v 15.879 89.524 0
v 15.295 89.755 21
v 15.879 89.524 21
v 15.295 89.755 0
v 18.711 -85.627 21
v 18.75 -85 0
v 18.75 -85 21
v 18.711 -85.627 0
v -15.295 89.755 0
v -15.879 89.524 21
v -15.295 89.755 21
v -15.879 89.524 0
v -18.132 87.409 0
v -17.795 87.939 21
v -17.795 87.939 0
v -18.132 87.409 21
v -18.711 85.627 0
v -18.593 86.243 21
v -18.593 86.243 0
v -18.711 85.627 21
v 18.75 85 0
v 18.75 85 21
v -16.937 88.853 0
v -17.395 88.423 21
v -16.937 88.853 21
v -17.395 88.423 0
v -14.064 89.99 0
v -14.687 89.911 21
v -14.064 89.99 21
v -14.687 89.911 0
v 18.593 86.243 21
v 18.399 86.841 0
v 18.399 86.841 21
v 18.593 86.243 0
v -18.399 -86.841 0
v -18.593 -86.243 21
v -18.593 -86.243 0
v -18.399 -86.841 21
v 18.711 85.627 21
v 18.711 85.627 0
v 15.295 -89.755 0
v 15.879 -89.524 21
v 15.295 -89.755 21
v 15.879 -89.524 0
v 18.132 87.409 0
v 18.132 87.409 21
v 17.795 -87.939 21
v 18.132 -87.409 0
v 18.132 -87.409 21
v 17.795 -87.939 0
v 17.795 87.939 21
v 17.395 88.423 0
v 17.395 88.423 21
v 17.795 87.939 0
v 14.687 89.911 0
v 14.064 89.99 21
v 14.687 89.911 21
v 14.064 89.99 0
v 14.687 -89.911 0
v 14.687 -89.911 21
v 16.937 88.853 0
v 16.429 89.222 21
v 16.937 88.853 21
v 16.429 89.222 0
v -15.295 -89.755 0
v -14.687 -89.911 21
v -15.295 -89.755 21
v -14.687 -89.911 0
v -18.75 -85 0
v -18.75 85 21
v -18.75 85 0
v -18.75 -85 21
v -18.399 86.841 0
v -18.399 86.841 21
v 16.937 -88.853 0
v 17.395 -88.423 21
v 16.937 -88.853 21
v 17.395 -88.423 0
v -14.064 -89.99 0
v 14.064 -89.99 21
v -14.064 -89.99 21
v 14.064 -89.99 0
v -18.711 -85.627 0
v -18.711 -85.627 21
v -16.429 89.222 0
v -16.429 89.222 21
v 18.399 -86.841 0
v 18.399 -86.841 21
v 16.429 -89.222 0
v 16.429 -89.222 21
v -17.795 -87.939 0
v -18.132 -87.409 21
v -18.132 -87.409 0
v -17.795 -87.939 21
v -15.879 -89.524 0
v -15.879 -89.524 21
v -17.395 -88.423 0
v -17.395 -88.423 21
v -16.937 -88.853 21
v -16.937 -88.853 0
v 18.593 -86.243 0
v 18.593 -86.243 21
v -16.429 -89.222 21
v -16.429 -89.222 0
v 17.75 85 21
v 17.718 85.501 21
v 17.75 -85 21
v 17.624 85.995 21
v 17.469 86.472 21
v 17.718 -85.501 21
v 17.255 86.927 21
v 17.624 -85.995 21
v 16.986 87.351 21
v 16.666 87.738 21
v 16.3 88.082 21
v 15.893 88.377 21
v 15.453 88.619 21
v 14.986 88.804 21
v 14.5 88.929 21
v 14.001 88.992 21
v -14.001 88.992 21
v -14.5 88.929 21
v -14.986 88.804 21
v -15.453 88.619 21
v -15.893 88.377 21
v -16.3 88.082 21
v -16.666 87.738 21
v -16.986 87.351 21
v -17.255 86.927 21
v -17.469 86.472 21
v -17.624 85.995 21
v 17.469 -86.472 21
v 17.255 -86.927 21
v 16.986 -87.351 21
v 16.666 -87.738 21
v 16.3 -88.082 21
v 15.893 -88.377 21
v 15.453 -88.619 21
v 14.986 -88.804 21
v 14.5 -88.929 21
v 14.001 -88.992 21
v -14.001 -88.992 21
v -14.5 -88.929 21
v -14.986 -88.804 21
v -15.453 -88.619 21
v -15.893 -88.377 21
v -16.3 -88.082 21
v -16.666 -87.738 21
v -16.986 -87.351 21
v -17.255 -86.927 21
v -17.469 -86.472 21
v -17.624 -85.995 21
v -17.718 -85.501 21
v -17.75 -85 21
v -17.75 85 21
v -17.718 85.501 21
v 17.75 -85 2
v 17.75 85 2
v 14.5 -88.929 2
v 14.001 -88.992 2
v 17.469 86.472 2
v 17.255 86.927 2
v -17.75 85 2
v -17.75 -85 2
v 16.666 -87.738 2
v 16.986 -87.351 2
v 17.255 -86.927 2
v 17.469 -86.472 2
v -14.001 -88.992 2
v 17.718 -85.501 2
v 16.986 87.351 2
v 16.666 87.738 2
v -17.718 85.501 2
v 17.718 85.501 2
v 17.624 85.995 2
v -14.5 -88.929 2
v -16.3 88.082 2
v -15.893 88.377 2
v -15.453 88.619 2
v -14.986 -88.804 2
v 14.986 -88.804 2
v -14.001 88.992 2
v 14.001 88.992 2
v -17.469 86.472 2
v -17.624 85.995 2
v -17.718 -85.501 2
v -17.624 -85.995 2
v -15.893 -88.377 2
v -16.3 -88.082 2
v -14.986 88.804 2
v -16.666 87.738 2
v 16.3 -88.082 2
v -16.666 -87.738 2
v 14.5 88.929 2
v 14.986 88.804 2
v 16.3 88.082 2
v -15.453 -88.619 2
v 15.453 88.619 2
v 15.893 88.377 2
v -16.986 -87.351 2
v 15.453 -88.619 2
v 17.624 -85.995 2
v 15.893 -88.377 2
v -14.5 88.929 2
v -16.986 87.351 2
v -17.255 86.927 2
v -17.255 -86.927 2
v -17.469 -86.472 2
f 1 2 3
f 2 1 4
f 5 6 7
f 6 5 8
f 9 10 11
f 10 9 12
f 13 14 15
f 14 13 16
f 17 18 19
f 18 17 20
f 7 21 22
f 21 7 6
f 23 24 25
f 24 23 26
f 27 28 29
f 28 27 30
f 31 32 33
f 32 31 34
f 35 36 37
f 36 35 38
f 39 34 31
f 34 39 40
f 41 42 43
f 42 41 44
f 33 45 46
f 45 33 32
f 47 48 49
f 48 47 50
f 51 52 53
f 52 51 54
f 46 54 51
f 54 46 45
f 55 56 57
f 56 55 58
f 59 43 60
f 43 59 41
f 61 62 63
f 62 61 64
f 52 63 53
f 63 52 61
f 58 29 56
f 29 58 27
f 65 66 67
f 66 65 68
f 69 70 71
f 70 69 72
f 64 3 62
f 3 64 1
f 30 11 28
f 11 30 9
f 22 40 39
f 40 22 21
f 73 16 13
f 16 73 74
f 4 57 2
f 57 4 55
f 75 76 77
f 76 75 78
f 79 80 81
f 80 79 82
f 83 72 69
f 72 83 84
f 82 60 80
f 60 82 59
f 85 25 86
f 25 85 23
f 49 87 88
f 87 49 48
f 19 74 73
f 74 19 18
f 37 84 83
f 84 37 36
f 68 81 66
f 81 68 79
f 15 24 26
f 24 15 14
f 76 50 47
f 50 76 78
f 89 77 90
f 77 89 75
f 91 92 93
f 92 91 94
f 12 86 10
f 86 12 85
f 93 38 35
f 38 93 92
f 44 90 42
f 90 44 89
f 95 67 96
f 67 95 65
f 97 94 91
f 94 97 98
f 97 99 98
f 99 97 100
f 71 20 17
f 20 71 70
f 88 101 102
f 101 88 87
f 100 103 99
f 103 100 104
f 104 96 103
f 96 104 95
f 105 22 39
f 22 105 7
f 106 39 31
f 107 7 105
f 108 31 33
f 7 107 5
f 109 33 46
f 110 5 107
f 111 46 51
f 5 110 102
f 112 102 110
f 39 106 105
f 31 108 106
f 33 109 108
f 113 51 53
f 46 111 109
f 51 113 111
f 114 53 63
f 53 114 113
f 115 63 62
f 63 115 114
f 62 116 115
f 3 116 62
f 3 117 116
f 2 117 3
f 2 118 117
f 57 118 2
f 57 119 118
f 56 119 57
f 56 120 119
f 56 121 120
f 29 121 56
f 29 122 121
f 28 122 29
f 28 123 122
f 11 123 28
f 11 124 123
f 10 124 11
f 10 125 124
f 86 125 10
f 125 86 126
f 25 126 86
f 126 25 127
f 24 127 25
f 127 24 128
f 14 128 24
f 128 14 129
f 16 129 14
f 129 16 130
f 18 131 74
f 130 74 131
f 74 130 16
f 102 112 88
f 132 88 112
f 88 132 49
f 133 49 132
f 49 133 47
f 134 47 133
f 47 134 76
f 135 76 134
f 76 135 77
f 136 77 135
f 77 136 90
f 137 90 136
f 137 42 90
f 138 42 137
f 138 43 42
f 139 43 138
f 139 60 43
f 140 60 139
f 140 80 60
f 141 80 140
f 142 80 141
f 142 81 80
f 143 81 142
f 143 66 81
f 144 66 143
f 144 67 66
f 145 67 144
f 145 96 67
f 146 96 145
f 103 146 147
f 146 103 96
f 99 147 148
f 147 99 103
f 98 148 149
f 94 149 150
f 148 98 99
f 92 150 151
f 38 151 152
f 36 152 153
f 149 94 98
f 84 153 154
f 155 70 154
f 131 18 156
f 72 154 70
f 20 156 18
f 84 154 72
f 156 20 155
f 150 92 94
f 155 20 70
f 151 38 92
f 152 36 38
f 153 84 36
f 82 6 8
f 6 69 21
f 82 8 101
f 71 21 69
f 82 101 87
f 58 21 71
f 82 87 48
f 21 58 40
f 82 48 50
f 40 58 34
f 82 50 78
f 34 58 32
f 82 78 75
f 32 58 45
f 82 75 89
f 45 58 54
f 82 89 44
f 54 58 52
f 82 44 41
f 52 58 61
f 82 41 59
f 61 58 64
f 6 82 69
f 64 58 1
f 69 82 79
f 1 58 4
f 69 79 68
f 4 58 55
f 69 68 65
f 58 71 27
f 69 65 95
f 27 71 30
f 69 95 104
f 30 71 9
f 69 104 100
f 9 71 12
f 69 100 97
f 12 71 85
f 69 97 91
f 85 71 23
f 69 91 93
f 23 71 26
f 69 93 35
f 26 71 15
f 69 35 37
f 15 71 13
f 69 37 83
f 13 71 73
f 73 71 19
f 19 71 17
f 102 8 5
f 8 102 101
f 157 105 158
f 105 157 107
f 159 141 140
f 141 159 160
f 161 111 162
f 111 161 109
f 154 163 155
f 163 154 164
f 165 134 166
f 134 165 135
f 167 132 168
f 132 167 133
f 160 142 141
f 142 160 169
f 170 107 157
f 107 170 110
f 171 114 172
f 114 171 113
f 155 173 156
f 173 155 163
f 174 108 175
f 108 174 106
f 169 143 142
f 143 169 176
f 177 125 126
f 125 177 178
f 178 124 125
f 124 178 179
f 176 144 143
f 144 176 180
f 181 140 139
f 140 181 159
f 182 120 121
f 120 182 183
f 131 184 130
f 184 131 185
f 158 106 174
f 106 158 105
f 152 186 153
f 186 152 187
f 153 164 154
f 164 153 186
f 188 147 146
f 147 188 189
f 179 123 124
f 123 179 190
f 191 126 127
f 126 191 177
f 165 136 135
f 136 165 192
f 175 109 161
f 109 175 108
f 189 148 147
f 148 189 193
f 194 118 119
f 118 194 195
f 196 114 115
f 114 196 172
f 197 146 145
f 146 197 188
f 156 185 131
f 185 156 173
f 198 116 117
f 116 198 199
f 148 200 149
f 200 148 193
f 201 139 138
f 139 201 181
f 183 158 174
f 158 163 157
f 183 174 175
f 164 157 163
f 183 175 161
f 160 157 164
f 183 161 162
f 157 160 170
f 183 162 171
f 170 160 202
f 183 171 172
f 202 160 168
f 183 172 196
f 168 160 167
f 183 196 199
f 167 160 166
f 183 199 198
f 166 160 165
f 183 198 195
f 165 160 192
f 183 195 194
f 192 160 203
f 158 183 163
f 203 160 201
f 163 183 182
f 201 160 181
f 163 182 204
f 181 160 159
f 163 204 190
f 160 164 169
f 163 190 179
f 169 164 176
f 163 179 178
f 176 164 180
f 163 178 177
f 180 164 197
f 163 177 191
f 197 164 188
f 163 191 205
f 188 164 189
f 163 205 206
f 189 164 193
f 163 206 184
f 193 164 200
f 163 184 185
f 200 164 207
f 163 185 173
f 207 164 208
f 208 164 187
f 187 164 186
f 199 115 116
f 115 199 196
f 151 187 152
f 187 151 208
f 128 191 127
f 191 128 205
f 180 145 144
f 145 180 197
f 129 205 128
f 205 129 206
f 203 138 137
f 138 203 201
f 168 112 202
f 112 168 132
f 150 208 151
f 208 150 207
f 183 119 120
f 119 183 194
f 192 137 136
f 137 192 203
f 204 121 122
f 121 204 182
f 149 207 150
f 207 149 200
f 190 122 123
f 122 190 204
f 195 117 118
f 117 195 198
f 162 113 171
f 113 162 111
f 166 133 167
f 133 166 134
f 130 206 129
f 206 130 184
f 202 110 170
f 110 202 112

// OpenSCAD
$fn = 50;


difference() {
	union() {
		hull() {
			translate(v = [-13.7500000000, 85.0000000000, 0]) {
				cylinder(h = 21, r = 5);
			}
			translate(v = [13.7500000000, 85.0000000000, 0]) {
				cylinder(h = 21, r = 5);
			}
			translate(v = [-13.7500000000, -85.0000000000, 0]) {
				cylinder(h = 21, r = 5);
			}
			translate(v = [13.7500000000, -85.0000000000, 0]) {
				cylinder(h = 21, r = 5);
			}
		}
	}
	union() {
		translate(v = [0, 0, 2]) {
			hull() {
				translate(v = [-13.7500000000, 85.0000000000, 0]) {
					cylinder(h = 19, r = 4);
				}
				translate(v = [13.7500000000, 85.0000000000, 0]) {
					cylinder(h = 19, r = 4);
				}
				translate(v = [-13.7500000000, -85.0000000000, 0]) {
					cylinder(h = 19, r = 4);
				}
				translate(v = [13.7500000000, -85.0000000000, 0]) {
					cylinder(h = 19, r = 4);
				}
			}
		}
	}
}
